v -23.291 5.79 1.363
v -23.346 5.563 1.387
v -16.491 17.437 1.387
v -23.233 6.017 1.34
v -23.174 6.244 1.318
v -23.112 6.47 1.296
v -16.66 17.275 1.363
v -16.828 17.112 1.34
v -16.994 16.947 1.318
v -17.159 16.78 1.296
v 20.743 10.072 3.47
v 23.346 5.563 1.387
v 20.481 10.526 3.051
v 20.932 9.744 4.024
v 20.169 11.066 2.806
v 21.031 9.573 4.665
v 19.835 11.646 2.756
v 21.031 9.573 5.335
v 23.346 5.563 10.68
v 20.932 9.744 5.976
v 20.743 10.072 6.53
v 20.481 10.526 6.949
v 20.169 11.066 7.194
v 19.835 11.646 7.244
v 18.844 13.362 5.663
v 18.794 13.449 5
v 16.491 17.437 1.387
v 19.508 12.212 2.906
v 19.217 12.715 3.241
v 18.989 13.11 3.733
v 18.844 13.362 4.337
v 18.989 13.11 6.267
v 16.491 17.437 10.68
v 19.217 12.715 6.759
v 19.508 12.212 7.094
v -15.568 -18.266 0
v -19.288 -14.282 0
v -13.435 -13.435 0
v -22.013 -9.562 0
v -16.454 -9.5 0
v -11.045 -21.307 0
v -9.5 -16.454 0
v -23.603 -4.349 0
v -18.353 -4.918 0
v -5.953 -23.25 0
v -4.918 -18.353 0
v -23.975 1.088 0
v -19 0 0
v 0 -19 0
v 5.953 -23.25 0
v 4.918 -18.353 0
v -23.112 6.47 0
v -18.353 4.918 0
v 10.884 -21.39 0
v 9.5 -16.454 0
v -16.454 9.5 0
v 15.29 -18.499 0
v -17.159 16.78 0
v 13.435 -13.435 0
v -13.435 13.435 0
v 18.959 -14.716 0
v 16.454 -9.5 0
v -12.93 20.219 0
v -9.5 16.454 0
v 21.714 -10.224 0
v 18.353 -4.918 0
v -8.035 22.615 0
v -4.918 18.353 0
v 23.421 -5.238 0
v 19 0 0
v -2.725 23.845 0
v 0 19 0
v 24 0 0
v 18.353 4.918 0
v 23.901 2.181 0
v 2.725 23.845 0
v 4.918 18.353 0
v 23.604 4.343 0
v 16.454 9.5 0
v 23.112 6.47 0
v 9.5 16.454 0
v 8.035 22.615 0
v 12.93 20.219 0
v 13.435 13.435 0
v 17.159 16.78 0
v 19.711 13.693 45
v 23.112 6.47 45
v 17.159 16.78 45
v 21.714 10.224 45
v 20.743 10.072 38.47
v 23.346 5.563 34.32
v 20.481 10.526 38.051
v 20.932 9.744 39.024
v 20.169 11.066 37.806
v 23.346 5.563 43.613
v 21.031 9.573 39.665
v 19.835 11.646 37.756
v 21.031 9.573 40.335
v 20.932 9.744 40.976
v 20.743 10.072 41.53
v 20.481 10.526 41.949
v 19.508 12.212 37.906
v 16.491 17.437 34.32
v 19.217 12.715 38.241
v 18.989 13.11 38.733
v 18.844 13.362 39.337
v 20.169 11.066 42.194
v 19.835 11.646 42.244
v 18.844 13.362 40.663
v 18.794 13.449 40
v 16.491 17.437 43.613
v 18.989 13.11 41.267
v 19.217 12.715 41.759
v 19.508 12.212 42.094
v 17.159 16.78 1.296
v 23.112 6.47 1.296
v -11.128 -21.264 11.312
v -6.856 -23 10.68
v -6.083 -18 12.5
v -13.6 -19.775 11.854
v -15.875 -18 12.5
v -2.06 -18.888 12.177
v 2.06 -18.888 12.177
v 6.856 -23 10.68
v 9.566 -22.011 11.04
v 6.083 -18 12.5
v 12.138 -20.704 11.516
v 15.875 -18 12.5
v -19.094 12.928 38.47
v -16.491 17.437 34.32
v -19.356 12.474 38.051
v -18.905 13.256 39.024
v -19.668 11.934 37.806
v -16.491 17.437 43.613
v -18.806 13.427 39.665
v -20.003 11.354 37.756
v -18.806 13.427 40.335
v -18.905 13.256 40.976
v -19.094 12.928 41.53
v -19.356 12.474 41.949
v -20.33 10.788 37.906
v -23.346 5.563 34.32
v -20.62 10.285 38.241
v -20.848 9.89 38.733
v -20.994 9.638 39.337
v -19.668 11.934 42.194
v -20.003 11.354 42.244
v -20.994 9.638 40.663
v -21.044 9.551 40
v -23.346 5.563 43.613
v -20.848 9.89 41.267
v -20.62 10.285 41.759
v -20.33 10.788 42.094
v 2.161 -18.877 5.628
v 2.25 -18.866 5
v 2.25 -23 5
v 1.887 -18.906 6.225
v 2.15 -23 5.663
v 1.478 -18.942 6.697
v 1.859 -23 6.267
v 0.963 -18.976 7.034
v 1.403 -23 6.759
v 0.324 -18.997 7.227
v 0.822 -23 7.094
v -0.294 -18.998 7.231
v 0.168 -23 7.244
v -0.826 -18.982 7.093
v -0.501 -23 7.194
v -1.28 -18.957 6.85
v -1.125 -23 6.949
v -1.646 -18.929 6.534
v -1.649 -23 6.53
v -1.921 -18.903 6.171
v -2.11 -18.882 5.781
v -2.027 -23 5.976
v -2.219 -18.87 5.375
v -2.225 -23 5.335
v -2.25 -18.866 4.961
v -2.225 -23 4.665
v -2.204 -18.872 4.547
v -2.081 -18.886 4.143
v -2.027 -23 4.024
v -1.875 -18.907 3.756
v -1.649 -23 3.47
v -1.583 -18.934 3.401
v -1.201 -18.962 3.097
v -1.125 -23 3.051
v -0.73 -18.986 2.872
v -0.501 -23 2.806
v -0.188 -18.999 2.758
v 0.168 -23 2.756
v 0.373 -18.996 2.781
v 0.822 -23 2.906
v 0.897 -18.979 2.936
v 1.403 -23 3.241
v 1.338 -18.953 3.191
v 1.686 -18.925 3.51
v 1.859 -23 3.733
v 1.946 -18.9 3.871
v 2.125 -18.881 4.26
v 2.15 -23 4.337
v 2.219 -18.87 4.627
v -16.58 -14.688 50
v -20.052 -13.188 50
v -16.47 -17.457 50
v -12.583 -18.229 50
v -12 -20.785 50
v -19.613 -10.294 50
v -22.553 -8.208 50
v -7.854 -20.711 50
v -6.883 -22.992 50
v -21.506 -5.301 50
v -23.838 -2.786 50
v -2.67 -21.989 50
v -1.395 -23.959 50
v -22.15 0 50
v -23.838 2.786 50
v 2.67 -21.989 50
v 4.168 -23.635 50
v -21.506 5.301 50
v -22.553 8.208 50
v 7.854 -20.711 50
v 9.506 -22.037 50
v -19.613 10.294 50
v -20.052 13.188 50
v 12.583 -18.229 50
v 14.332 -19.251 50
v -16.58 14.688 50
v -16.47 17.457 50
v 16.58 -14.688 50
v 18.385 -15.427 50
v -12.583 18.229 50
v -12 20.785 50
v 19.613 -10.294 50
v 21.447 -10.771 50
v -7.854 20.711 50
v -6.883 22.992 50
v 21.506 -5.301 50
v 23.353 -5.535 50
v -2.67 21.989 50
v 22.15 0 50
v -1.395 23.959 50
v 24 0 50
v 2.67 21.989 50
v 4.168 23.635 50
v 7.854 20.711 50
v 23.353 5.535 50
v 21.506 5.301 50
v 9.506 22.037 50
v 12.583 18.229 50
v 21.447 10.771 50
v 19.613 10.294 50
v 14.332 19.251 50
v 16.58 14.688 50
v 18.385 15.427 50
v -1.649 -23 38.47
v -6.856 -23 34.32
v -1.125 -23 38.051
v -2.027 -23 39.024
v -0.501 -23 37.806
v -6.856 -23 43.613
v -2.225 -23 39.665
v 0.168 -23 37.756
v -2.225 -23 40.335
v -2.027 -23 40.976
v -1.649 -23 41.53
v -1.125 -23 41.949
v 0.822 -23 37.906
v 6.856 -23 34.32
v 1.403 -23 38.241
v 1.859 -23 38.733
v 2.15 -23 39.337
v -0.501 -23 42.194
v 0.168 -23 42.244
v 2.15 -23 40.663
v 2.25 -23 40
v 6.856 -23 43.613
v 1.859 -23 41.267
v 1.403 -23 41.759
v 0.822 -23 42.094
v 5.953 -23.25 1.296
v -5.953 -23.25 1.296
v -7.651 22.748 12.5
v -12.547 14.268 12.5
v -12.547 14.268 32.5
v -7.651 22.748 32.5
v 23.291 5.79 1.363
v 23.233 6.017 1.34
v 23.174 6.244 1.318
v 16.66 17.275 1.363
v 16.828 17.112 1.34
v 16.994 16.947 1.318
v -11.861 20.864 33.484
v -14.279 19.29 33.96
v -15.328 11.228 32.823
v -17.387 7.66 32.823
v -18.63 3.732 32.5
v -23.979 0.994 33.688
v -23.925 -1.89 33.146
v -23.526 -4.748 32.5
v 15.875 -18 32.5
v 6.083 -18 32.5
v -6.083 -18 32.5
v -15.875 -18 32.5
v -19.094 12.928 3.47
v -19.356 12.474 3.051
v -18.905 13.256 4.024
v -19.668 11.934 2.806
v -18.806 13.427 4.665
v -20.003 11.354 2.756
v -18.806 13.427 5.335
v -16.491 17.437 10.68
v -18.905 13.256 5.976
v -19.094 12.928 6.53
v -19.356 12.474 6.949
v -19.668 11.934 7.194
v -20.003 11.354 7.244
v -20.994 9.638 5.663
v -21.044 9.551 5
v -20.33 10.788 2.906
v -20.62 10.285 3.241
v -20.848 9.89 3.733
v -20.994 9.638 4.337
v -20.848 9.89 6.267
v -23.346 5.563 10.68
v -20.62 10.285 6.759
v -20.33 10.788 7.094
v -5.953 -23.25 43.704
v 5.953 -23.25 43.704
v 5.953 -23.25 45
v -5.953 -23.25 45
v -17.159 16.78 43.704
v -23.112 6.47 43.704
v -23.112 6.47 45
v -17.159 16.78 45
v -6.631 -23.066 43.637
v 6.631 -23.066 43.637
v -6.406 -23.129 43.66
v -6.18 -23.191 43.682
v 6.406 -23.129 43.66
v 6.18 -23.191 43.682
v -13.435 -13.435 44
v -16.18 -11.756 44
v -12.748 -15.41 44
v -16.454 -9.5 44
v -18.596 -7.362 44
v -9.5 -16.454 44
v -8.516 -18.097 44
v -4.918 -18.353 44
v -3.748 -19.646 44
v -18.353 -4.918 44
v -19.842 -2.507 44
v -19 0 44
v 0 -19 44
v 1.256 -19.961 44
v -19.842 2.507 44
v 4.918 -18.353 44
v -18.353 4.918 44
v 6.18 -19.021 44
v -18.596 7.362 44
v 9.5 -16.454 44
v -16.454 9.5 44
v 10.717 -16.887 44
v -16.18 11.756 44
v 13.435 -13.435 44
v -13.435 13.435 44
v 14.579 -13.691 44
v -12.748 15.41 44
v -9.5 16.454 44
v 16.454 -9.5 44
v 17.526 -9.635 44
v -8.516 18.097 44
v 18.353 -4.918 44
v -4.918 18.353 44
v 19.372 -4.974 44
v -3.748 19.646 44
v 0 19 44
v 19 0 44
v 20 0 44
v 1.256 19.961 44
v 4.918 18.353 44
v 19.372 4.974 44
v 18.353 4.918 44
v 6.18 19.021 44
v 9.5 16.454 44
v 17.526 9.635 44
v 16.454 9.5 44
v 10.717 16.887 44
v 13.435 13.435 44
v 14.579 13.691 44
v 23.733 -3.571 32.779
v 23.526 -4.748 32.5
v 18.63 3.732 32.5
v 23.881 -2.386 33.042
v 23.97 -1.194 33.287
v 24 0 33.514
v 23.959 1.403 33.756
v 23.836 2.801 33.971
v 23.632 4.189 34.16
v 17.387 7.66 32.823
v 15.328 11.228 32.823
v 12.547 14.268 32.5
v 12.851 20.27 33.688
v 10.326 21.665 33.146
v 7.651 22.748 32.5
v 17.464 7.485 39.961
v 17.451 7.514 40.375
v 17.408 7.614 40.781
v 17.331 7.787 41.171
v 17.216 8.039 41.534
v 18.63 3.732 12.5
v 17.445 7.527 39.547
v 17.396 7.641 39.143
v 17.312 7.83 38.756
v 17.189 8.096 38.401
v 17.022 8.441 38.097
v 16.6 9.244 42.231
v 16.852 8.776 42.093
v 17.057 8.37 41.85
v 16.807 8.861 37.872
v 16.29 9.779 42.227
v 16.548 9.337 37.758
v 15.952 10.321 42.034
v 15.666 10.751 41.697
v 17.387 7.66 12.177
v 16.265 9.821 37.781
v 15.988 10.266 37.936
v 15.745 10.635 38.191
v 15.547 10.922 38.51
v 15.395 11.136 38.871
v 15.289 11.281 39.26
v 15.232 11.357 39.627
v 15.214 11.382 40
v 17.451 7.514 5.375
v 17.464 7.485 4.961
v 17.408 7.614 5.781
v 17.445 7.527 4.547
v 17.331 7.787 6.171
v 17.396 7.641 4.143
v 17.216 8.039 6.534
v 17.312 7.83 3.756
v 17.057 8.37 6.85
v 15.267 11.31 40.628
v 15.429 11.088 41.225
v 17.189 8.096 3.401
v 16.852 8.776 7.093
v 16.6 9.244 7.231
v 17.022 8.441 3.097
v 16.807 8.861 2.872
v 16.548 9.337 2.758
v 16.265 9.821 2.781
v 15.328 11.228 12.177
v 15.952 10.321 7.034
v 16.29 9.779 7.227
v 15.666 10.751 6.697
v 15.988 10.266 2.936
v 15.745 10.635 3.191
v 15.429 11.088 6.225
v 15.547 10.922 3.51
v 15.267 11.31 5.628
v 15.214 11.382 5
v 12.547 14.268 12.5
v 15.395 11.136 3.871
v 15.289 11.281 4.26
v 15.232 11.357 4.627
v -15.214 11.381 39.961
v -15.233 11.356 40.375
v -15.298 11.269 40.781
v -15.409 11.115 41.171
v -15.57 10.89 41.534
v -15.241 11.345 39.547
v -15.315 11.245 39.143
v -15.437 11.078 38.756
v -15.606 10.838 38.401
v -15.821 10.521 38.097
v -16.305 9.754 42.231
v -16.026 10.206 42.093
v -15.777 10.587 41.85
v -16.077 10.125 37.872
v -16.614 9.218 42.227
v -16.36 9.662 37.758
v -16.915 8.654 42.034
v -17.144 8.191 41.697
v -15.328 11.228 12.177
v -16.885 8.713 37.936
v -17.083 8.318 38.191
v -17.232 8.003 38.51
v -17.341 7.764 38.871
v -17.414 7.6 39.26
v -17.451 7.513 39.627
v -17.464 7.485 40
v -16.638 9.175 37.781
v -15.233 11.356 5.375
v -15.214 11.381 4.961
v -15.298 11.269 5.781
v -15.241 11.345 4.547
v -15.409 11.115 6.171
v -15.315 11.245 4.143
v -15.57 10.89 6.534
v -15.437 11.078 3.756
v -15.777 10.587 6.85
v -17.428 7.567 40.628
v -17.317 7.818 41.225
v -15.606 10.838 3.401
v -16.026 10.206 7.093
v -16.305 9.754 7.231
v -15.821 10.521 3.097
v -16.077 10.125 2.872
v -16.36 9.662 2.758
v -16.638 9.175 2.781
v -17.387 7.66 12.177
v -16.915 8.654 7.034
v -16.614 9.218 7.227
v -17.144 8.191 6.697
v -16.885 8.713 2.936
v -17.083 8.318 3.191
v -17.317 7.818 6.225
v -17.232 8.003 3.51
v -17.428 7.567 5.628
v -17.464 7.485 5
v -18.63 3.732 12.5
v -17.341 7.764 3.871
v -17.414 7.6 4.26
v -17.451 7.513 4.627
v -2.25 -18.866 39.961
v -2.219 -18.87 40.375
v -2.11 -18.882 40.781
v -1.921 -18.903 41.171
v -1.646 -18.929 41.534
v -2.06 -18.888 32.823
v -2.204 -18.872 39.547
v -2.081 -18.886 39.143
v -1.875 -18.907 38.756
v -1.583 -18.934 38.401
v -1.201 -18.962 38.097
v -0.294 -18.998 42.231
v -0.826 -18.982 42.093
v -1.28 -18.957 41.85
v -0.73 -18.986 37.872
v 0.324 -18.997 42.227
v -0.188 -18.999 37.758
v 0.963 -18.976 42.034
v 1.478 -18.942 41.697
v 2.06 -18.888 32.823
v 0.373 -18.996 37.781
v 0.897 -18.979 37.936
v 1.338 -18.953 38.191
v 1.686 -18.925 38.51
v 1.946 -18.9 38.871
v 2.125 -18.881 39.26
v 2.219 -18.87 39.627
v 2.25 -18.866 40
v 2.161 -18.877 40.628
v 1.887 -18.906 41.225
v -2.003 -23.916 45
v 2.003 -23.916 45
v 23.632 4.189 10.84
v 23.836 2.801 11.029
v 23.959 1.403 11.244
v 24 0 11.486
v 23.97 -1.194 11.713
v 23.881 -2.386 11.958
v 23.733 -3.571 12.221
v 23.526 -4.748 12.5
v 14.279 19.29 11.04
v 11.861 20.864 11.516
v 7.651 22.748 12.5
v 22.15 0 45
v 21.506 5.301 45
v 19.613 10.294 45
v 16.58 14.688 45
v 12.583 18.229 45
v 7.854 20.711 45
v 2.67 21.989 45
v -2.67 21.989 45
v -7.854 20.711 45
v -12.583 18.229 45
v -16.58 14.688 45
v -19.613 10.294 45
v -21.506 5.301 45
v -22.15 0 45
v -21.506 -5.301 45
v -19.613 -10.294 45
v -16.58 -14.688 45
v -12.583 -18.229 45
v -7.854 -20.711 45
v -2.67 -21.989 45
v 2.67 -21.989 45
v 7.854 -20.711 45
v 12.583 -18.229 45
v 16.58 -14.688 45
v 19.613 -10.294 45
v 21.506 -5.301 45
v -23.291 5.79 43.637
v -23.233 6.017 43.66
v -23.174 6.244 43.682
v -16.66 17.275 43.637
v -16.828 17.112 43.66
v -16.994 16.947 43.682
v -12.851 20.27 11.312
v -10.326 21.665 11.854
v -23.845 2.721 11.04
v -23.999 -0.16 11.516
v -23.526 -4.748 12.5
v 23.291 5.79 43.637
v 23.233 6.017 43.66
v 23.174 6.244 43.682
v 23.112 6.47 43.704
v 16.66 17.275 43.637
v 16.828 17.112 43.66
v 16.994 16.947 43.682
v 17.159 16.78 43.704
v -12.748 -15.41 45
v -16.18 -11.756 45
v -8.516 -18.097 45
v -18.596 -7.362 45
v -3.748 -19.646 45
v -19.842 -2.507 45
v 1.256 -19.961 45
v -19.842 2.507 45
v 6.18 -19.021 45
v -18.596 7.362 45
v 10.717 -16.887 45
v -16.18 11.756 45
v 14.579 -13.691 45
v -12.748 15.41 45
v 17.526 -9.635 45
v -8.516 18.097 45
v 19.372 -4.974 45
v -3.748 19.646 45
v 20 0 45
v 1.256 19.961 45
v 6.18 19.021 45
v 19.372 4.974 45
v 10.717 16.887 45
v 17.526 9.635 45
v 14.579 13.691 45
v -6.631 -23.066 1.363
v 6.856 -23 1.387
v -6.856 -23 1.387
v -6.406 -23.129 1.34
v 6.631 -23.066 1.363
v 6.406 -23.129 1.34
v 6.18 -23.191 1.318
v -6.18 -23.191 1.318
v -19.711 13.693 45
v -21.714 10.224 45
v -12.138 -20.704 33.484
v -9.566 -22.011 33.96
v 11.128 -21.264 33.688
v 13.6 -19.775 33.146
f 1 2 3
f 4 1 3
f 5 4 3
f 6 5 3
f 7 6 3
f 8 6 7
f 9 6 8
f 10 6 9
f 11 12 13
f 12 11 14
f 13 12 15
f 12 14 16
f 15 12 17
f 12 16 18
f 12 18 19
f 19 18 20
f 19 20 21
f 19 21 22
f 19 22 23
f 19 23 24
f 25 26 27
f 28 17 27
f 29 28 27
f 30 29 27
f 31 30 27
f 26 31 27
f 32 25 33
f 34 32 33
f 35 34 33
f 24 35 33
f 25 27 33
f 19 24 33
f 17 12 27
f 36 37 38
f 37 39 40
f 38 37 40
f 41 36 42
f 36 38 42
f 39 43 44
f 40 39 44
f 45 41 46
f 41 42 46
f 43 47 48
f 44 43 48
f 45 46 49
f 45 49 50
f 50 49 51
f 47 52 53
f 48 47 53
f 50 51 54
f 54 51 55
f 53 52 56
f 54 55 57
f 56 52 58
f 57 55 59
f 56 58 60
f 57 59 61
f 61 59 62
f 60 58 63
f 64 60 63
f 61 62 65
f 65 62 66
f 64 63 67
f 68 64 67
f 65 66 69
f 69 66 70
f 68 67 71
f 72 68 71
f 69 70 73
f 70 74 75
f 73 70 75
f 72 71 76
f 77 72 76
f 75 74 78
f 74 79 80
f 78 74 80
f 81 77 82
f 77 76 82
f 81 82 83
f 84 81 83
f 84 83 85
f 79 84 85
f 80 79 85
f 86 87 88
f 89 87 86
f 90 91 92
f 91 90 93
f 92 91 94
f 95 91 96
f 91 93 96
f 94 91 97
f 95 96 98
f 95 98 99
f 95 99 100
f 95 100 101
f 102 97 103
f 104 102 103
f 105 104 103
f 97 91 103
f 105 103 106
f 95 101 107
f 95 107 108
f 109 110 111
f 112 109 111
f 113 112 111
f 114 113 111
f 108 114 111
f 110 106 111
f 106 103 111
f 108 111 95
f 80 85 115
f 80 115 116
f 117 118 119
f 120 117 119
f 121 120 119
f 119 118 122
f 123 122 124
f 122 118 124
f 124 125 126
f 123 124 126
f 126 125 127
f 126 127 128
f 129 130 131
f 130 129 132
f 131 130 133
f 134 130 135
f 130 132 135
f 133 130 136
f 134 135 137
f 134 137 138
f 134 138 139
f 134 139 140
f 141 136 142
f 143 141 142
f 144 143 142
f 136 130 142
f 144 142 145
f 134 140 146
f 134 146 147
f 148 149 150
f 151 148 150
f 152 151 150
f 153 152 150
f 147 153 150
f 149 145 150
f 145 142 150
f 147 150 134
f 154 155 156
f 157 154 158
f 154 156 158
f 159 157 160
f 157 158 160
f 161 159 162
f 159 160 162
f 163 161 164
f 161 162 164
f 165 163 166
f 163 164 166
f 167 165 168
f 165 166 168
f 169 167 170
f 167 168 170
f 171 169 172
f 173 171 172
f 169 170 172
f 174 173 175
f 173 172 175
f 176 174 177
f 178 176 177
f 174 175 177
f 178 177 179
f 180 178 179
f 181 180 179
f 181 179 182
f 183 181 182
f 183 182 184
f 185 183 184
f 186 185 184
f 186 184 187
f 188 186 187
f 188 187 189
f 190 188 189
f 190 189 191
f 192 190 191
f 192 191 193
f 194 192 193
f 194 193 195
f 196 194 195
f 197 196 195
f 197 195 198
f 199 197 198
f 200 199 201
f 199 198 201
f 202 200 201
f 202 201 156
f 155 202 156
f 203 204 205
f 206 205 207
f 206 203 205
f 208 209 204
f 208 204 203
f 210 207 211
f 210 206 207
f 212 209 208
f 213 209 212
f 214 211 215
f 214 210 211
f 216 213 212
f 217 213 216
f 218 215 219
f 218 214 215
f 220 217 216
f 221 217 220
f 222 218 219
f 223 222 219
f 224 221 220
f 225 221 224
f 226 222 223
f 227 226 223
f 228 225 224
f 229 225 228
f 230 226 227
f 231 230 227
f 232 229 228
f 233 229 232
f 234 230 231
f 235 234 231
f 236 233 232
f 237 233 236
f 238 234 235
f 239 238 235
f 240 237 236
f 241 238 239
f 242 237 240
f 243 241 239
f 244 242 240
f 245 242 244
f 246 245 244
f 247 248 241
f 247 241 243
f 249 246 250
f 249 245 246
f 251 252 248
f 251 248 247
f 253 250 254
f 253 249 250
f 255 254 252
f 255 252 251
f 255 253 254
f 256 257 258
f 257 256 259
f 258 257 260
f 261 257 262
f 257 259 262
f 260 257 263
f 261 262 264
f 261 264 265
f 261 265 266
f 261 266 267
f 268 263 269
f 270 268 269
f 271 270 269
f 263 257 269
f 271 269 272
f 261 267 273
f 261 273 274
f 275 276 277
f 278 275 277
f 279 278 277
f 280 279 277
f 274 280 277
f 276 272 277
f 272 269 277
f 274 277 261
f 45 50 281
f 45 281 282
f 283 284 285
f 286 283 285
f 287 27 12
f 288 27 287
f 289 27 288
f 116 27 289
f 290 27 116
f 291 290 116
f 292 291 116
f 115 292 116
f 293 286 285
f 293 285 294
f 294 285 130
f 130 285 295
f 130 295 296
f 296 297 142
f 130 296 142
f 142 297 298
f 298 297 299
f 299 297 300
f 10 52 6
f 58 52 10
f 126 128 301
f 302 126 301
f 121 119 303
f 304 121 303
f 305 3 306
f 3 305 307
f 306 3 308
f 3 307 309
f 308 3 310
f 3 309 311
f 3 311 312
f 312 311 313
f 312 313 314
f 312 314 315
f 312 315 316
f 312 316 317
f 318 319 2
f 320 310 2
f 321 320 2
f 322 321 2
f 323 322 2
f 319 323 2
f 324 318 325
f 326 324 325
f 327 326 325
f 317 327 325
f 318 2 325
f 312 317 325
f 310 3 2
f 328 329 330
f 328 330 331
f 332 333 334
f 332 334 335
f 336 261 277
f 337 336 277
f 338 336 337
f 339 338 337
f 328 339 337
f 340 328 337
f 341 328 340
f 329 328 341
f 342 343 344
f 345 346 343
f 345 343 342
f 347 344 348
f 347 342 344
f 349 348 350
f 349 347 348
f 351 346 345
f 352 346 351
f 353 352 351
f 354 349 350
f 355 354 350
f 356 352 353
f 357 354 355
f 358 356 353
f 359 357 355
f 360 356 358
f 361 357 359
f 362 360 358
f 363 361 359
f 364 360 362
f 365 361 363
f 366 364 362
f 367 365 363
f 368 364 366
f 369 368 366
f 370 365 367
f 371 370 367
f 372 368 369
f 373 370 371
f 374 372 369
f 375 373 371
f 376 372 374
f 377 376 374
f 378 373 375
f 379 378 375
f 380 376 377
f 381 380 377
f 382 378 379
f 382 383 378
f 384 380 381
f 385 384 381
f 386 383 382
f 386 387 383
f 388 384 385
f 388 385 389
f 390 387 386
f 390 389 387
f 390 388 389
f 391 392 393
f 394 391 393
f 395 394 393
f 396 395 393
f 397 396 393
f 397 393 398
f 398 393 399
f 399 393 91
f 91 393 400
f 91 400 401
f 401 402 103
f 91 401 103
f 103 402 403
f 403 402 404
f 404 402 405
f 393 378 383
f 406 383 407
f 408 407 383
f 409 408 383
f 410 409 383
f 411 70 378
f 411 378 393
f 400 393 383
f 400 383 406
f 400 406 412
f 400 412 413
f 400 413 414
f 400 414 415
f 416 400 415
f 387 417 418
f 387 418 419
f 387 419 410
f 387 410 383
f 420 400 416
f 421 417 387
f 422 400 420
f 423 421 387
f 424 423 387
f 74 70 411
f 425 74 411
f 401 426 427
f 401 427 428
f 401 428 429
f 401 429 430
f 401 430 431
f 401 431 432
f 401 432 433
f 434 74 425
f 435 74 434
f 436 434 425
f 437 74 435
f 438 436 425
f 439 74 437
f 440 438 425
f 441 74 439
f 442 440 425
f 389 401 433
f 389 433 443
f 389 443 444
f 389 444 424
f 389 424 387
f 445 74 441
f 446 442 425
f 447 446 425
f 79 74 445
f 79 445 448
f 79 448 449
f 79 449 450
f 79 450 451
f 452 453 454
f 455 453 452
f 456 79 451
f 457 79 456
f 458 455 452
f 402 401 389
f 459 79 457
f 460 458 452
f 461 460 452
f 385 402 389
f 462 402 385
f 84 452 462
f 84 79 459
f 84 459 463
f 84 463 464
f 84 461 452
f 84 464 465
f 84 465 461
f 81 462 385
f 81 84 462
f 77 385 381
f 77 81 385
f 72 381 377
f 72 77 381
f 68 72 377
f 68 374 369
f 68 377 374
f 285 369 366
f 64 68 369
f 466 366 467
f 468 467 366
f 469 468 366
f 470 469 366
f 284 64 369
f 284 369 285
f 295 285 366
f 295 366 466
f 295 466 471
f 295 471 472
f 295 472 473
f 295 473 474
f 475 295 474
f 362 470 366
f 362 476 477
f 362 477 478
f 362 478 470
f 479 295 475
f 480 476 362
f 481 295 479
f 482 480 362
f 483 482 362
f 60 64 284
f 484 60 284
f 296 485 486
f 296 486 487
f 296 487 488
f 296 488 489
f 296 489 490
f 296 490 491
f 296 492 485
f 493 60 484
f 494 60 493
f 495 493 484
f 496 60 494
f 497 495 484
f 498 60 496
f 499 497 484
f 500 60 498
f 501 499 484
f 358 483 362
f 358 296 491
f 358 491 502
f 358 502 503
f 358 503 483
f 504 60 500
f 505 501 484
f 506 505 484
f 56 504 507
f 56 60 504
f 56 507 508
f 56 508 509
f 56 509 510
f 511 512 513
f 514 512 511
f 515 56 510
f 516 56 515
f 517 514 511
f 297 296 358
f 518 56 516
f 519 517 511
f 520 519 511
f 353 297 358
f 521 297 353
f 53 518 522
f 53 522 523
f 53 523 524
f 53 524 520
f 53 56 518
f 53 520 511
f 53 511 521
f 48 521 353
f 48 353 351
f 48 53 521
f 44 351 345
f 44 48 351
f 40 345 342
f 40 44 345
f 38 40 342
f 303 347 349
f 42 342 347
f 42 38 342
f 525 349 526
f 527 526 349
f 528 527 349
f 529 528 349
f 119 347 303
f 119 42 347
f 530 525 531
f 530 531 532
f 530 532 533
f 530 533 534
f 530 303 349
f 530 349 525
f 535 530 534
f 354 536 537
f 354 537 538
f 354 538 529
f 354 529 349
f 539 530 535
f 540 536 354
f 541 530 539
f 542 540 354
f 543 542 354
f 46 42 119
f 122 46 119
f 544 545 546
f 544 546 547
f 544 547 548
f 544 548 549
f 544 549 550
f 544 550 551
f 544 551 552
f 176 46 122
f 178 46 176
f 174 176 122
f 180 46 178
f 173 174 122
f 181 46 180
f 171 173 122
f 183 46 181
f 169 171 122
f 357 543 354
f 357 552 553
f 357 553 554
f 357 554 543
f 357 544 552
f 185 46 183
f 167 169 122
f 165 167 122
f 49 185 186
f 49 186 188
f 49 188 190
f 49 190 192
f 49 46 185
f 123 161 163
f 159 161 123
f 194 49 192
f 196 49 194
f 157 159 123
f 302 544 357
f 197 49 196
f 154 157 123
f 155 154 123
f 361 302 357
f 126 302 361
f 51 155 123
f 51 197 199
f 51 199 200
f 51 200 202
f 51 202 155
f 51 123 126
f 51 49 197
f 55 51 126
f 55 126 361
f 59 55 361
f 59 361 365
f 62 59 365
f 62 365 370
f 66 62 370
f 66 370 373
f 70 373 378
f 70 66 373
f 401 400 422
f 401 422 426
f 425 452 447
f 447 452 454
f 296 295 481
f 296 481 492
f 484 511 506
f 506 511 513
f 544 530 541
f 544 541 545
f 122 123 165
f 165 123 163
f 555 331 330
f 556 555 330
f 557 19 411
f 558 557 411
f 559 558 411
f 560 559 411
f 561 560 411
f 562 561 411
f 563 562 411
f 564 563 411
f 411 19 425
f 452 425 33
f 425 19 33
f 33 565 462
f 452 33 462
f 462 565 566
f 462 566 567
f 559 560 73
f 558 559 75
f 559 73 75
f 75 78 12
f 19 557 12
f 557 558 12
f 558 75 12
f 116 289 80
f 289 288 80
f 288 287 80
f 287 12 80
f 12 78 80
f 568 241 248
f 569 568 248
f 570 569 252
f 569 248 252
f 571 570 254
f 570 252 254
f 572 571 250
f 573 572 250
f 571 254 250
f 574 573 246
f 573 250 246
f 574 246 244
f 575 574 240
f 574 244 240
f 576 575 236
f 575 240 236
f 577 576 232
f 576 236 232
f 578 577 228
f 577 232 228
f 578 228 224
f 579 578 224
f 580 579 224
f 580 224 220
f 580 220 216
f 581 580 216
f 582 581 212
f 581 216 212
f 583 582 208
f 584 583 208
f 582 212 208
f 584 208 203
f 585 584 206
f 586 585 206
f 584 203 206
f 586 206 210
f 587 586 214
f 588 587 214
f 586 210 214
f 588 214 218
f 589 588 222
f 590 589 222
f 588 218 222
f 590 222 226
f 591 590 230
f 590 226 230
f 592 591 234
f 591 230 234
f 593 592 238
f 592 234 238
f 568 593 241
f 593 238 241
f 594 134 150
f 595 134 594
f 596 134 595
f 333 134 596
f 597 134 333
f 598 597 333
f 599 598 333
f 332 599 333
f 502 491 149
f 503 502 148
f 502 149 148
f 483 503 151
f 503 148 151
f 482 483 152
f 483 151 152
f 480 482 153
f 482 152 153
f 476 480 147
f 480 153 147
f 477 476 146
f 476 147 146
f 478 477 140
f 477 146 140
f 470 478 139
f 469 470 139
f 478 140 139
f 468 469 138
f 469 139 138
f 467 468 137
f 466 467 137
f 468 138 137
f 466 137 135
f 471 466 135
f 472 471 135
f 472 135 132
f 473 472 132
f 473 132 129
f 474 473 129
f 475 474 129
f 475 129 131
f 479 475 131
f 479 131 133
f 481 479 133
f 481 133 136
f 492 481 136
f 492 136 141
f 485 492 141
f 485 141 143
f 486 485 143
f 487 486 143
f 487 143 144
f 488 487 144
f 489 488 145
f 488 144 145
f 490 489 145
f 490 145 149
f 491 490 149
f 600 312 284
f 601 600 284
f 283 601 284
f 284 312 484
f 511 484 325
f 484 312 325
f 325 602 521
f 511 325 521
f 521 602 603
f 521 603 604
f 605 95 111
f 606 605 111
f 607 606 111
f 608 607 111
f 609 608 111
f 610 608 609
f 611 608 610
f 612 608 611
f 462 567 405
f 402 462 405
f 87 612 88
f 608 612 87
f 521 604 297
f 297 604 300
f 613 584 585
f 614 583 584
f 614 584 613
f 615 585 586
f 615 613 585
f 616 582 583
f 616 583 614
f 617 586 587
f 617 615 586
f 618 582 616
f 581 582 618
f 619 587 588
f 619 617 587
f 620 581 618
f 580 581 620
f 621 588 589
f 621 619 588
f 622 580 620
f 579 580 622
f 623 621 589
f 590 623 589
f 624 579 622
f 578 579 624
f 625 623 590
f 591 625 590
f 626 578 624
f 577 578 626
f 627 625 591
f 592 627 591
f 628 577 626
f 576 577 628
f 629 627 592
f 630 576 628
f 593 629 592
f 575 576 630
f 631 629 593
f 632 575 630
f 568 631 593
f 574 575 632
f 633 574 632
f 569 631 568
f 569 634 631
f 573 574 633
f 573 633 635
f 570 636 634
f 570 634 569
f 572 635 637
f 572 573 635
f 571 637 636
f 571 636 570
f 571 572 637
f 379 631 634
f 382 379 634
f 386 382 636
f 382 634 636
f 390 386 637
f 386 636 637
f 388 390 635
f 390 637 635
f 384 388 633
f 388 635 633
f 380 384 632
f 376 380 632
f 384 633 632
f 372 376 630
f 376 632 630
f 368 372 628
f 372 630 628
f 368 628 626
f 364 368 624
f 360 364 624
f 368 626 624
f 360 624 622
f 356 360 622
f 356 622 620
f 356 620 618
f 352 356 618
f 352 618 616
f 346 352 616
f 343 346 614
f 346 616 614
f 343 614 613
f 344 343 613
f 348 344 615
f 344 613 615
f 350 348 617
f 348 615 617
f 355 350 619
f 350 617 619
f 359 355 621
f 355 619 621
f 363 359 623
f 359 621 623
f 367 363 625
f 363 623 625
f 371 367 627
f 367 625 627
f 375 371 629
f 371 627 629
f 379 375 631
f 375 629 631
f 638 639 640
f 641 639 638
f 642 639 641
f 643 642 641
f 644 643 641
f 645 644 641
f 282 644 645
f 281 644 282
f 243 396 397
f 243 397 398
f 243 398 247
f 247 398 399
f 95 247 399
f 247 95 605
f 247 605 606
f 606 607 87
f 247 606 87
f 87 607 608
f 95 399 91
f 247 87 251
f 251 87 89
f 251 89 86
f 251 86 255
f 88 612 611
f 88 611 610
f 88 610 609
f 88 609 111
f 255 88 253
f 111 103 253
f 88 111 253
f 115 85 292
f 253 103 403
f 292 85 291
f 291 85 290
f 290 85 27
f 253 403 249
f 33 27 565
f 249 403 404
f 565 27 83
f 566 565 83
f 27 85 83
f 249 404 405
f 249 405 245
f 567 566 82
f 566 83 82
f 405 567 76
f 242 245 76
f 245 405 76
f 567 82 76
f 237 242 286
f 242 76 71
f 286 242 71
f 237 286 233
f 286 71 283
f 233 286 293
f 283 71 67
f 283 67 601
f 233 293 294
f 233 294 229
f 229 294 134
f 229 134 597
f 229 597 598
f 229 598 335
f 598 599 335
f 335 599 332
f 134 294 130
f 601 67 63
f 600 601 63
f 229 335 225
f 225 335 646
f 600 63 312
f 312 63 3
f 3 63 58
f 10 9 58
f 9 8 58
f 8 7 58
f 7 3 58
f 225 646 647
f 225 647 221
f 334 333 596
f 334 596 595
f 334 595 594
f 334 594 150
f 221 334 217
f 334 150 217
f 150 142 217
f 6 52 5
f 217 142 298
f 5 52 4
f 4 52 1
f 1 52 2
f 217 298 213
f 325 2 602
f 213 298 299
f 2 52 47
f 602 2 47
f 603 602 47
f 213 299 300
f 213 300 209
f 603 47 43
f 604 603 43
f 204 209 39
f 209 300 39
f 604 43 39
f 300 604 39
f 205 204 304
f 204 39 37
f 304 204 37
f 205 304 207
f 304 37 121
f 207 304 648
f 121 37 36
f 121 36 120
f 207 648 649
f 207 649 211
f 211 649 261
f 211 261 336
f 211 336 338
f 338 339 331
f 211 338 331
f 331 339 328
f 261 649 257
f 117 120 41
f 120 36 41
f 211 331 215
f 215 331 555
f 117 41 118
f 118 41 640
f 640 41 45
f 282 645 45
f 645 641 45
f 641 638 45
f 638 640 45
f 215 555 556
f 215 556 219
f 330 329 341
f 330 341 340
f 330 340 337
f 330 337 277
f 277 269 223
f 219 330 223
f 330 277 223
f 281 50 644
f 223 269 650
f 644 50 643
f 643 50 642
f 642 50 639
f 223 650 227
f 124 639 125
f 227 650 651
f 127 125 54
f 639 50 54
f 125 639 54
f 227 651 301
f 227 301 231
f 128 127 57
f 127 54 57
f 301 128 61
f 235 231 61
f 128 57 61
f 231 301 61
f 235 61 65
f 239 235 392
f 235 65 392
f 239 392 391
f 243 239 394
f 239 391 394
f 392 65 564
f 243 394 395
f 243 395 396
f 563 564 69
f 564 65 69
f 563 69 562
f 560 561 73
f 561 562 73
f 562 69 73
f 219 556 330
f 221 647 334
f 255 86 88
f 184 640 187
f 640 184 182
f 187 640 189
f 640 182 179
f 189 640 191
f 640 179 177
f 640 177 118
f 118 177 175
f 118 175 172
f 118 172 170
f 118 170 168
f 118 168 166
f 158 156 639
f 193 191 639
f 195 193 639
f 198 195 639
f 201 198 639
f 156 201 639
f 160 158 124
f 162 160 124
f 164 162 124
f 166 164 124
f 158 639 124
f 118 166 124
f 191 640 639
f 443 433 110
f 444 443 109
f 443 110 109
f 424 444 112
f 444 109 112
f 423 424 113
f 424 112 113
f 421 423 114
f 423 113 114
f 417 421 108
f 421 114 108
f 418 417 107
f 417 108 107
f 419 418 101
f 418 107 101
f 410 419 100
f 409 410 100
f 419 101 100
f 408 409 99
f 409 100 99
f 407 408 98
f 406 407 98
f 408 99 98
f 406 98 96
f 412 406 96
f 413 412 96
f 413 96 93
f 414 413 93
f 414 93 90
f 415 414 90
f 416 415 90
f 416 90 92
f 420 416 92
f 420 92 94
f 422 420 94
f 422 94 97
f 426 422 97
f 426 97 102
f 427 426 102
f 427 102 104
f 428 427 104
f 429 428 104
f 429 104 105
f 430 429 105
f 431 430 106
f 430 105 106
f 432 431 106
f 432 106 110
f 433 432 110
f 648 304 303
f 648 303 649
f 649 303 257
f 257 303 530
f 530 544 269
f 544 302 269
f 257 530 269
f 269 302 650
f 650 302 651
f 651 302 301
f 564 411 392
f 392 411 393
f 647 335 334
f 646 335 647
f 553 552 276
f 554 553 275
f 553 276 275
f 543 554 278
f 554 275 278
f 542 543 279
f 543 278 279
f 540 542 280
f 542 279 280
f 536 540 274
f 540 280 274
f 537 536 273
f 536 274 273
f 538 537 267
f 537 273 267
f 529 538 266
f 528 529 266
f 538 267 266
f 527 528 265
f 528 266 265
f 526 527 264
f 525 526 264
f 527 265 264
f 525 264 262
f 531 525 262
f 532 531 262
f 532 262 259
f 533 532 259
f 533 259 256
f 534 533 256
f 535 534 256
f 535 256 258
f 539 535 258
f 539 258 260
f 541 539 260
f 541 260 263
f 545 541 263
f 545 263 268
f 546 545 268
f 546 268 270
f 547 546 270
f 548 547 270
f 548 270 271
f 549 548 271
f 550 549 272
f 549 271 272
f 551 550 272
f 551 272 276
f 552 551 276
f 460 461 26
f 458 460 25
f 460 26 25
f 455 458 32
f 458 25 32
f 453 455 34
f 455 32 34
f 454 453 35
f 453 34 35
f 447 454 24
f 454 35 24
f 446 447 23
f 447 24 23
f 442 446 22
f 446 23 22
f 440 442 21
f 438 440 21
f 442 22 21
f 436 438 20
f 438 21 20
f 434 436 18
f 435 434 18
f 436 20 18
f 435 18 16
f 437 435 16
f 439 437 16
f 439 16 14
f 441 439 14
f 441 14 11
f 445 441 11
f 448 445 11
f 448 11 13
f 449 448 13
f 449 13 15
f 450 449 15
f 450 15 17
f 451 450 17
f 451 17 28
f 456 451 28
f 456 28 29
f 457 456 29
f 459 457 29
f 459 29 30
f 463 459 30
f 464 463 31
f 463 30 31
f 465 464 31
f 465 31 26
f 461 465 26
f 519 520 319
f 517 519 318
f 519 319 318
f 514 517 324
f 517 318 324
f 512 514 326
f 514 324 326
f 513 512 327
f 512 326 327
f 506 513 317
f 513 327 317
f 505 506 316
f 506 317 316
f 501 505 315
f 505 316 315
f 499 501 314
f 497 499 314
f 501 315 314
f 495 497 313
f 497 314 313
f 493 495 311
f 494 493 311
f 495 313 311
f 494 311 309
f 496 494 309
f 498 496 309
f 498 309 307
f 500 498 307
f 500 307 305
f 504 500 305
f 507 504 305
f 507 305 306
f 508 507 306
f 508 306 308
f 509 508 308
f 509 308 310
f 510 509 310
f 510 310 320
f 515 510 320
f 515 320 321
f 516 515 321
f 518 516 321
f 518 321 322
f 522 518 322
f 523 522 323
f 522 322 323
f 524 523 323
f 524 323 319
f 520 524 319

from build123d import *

# Parameters (mm, degrees)
F0_R           = 24
F0_R_2         = 19
F1_DEPTH       = 50
F2_R           = 22.15
F3_DEPTH       = 5
F4_R           = 20
F5_DEPTH       = 1
F6_R           = 57.967167
F7_DEPTH       = 45
F9_DEPTH       = 25
F10_COUNT      = 3
F10_ANGLE      = 240
F12_R          = 2.25
F13_DEPTH      = 10
F13_DEPTH_BACK = 10
F14_COUNT      = 3
F14_ANGLE      = 240


with BuildPart() as f1:
    # F0 (on Top) → F1 (new body)
    with BuildSketch(Plane.XY):
        Circle(F0_R)
        Circle(F0_R_2, mode=Mode.SUBTRACT)
    extrude(amount=F1_DEPTH)

    # F2 (on face) → F3 (cut)
    with BuildSketch(Plane.XY.offset(50)):
        Circle(F2_R)
    extrude(amount=-F3_DEPTH, mode=Mode.SUBTRACT)

    # F4 (on face) → F5 (cut)
    with BuildSketch(Plane.XY.offset(45)):
        Circle(F4_R)
    extrude(amount=-F5_DEPTH, mode=Mode.SUBTRACT)

    # F6 (on Top) → F7 (cut)
    with BuildSketch(Plane.XY):
        Circle(F6_R)
        Polygon((0, 46.5), (40.270181, -23.25), (-40.270181, -23.25), align=None, mode=Mode.SUBTRACT)
    extrude(amount=F7_DEPTH, mode=Mode.SUBTRACT)


with BuildPart() as f9:
    # F8 (on Right) → F9 (new body, symmetric)
    with BuildSketch(Plane.YZ):
        Polygon((-23, 34.319851), (-23, 43.612687), (-27.333883, 45.190091), (-27.333883, -0.190091), (-23, 1.387313), (-23, 10.680149), (-18, 12.5), (-18, 22.5), (-18, 32.5), align=None)
    extrude(amount=F9_DEPTH, both=True)


with BuildPart() as f10_1:
    # F10: instance of F9
    add(f9.part.rotate(Axis((0, 0, 0), (0, 0, -1)), 1 * F10_ANGLE / (F10_COUNT - 1)))


with BuildPart() as f10_2:
    # F10: instance of F9
    add(f9.part.rotate(Axis((0, 0, 0), (0, 0, -1)), 2 * F10_ANGLE / (F10_COUNT - 1)))


with BuildPart() as f1_1:
    add(f1.part)

    # F11: cut F10_2, F10_1, F9
    add(f10_2.part, mode=Mode.SUBTRACT)
    add(f10_1.part, mode=Mode.SUBTRACT)
    add(f9.part, mode=Mode.SUBTRACT)


with BuildPart() as f13:
    # F12 (on face) → F13 (new body, two sides)
    with BuildSketch(Plane.XZ.offset(23)) as f13_sk:
        with Locations((0, 40)):
            Circle(F12_R)
        with Locations((0, 5)):
            Circle(F12_R)
    extrude(amount=-F13_DEPTH)
    extrude(f13_sk.sketch, amount=-F13_DEPTH_BACK)


with BuildPart() as f14_1:
    # F14: instance of F13
    add(f13.part.rotate(Axis((0, 0, 0), (0, 0, -1)), 1 * F14_ANGLE / (F14_COUNT - 1)))


with BuildPart() as f14_2:
    # F14: instance of F13
    add(f13.part.rotate(Axis((0, 0, 0), (0, 0, -1)), 2 * F14_ANGLE / (F14_COUNT - 1)))


with BuildPart() as f1_2:
    add(f1_1.part)

    # F15: cut F14_2, F14_1, F13
    add(f14_2.part, mode=Mode.SUBTRACT)
    add(f14_1.part, mode=Mode.SUBTRACT)
    add(f13.part, mode=Mode.SUBTRACT)


solid = f1_2.part
